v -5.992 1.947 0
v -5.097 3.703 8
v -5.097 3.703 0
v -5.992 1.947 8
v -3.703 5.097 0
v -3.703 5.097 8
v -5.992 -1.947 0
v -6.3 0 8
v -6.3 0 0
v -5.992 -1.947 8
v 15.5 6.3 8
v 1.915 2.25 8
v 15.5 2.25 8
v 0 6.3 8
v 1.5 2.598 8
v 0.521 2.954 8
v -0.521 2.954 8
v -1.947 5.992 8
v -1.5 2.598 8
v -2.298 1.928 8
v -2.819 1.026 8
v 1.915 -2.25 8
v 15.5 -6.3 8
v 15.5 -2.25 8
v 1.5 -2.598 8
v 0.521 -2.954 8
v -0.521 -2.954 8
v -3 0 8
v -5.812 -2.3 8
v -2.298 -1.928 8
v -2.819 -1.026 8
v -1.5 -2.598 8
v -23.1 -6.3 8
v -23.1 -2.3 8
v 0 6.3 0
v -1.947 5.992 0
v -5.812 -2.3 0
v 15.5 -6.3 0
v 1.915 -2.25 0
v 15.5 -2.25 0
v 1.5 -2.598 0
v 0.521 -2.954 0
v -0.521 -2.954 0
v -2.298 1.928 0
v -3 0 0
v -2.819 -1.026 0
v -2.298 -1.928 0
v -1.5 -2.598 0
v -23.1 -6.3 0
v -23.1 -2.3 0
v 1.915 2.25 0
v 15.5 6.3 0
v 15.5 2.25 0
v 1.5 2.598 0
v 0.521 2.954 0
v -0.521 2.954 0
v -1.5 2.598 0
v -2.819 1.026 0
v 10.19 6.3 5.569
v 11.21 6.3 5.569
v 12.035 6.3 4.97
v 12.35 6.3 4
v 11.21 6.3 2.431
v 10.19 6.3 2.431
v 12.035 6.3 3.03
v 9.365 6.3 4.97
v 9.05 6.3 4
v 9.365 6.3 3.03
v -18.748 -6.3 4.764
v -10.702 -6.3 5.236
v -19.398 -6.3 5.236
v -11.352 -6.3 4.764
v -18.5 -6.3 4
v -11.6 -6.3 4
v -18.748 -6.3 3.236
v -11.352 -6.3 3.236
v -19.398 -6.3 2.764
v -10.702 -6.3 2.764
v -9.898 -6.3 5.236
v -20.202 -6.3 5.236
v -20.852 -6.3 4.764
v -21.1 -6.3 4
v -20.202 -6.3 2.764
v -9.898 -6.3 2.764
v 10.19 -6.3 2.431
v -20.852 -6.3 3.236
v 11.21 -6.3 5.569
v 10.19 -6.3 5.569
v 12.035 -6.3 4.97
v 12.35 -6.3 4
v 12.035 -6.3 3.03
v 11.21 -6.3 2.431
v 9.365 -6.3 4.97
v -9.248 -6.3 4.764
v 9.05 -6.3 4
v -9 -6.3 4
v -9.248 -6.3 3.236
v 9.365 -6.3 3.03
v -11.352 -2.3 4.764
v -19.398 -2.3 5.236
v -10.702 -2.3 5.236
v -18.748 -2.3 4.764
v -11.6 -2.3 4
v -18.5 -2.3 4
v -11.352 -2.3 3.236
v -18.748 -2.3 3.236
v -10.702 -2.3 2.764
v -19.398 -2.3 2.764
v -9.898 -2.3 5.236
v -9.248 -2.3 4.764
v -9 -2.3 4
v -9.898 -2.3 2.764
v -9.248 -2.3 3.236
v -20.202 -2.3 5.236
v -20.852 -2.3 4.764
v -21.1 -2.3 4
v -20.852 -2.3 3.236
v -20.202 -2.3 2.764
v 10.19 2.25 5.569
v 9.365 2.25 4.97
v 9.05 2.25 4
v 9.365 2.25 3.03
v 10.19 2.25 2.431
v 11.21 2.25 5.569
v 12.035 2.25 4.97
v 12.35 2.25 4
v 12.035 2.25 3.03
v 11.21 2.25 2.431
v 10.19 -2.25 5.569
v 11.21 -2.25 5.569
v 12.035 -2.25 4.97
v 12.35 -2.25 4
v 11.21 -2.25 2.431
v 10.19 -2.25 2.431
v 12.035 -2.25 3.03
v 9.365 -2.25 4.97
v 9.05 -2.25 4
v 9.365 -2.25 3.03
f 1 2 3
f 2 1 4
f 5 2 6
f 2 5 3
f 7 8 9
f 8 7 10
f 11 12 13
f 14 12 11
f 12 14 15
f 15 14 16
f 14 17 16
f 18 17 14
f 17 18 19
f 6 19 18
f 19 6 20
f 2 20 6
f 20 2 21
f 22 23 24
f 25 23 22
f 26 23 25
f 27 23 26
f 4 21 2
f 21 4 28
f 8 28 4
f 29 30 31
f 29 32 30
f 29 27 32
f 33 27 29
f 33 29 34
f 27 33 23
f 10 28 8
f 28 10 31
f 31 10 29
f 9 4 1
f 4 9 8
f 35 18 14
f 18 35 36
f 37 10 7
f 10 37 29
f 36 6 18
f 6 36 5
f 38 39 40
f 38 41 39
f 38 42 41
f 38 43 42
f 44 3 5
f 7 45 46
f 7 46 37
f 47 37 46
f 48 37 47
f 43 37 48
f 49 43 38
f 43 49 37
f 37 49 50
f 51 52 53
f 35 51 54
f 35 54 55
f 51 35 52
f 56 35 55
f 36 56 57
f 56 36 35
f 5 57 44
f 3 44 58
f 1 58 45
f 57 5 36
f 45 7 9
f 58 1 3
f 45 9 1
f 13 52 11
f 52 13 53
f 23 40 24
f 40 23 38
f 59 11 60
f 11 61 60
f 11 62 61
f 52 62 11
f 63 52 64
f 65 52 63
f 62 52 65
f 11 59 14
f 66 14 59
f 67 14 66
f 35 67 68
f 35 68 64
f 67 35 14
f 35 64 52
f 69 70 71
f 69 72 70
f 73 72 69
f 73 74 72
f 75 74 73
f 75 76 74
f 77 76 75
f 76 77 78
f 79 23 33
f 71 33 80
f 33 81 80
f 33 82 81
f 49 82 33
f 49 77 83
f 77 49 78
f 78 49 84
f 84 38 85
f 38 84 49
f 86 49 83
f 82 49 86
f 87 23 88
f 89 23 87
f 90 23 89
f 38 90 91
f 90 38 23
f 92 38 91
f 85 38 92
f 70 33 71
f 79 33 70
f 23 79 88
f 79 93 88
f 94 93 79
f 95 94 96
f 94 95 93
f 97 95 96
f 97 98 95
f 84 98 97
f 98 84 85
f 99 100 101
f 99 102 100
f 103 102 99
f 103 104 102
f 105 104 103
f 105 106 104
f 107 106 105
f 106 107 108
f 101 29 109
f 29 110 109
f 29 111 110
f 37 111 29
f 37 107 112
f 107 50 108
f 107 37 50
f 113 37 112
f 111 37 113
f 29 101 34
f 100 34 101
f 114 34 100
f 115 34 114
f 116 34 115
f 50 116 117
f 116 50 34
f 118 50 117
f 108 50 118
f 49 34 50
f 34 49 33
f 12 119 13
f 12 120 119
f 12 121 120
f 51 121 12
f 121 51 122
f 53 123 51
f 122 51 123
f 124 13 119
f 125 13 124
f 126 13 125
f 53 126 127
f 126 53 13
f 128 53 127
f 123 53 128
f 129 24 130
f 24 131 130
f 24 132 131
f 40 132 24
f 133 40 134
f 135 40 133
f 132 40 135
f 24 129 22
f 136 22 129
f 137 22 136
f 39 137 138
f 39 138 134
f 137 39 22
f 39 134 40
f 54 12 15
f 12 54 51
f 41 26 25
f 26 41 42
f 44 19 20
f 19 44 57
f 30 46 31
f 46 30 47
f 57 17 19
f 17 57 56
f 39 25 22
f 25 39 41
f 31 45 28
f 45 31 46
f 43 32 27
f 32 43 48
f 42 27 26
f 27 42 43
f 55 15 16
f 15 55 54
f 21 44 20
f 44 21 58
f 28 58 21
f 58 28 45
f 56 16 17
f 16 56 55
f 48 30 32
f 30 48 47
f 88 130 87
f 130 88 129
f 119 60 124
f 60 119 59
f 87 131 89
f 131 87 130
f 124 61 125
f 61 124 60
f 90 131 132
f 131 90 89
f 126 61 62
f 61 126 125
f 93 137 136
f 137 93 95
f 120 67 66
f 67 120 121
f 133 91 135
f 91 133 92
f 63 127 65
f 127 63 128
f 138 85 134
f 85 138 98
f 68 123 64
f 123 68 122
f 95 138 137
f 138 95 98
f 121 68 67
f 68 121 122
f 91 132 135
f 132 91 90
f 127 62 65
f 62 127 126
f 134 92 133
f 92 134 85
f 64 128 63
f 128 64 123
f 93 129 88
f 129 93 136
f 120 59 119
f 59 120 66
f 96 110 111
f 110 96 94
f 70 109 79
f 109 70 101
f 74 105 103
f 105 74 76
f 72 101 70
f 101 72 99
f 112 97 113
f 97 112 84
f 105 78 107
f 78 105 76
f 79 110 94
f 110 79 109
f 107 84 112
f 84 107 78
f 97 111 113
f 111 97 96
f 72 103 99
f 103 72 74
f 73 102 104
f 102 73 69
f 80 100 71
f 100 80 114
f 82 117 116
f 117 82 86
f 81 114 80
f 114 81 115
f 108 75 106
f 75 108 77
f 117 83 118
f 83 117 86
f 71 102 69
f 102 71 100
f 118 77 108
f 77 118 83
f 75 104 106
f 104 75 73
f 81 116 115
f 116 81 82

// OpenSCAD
// file: parameters.scad
// Parameters file for RepRap Huxley

pi=3.14159265;

// The relative location in your file system where the .dxf files are
// DXFs are for quick development.  They should be replaced by parameterised CSG in dure course.

fileroot="DXF-files/";

rodsize = 6;	//threaded/smooth rod diameter in mm
xaxis = 182.5;	//width of base in mm
yaxis = 266.5;	//length of base in mm


screwsize = 3;	//bearing bore/screw diameter in mm
bearingsize = 10;	//outer diameter of bearings in mm
bearingwidth = 4;	//width of bearings in mm


rodpitch = rodsize / 6;
rodnutsize = 0.8 * rodsize; //4.8
rodwashersize = 0.2 * rodsize; //1.2
rodwasherdiameter = 2 * rodsize;//12
screwpitch = screwsize / 6;
nutsize = 0.8 * screwsize;
nutdiameter = 1.9 * screwsize;
washersize = 0.2 * screwsize;
washerdiameter = 2 * screwsize;
partthick = 2 * (rodsize+1); //12
vertexrodspace = 2 * rodsize; //12


c = [0.3, 0.3, 0.3];
rodendoffset = rodnutsize + rodwashersize * 2 + partthick / 2;//13.2
vertexoffset = vertexrodspace + rodendoffset;//25.2
//vertexoffset = 22;

renderrodthreads = false;
renderscrewthreads = false;
fn = 36;

// The gap between the joining rods at a vertex

vertex_radius=sqrt(rodsize*rodsize + vertexoffset*vertexoffset);
vertex_ang = atan(vertexoffset/rodsize)-30;
vertex_gap = 2*vertex_radius*cos(vertex_ang);

// Nema 14 dimensions - these are absolute

nema14_square=35.3;
nema14_screws=26;
nema14_screw_r=1.5;
nema14_hub=22;
nema14_hub_depth=2;
nema14_length=36;
nema14_shaft=5;
nema14_shaft_length=66;
nema14_shaft_projection=19;

// Nema 11 dimensions - these are absolute

nema11_square=28.5;
nema11_screws=23;
nema11_screw_r=1.25;
nema11_hub=22;
nema11_hub_depth=2;
nema11_length=44.5;
nema11_shaft=5;
nema11_shaft_length=78;
nema11_shaft_projection=18;

// Limit switch parameters

limit_switch_hole_diameter=2.5;
limit_switch_centres=9.5;

// The RepRap slide bearings

bearing_mount_centres=18;
bearing_width=7;

// X axis parameters - many should be relative

x_bar_gap=30;
motor_center_y = 26;
bar_clamp_x=5;
bar_clamp_y=8;
bar_clamp_x_gap=23;
bearing_y=50;
bearing_x=bar_clamp_x_gap + 10;
hole_land=4;
thickness=5;
bearing_low_z = 8;
bearing_z_gap = 25;
bearing_plate_width = bearing_mount_centres+2*hole_land + 10;
bearing_plate_overlap=0.5;
bearing_plate_support=10;
// file: configuration.scad
// eMAKEr Huxley
// Configuration file
// GNU GPL v3
// Jean-Marc Giacalone
// info@emakershop.com
// www.emakershop.com
// http://www.reprap.org/wiki/EMAKER_Huxley
// http://github.com/jmgiacalone/eMAKERHuxley

use <library.scad>

//Round corner diameter
round_corner_diameter = 8;

//Thin wall size
layer_height = 0.4;
perimeter_width_over_thicknes = 1.6;
infill_widht_over_thickness = 1.55;
thin_wall = 2*(perimeter_width_over_thicknes*layer_height+infill_widht_over_thickness*layer_height);
if(thin_wall<2){
	echo("Check thin wall size, its below 2mm!");
}
echo(thin_wall);

// MINI-HUXLEY VERSION (TODO, just place holder)
// include <configuration-huxley.scad>
m8_diameter=8.3;
m5_diameter=5.3;
m4_diameter=4.3;
m3_diameter=3.3;
m3_dia_clr=3.5;
m3_nut = 2.8;
m3_af = 5.8;
m6_diameter = 6;
m6_nut = 11.5;
bushing_diameter = 8;
motor_shaft=5.3;
bushing_rodsize = 6;
bushing_outerDiameter = 12;
bushing_lenght = 8;

// Some basic functions, probably should be somewhere else
// main file
// PRUSA Mendel  
// Endstop holder
// Used to attach endstops to 8mm rods
// GNU GPL v2
// Josef Průša
// josefprusa@me.com
// prusadjs.cz
// http://www.reprap.org/wiki/Prusa_Mendel
// http://github.com/prusajr/PrusaMendel


// Modified by Adrian to include support for sub-min microswitches. 15 May 2011
// Modified by JMG to fit 6mm rod for eMAKER Huxley. 5 Aug 2011

include <./configuration.scad>


/**
 *@name Endstop holder
 *@using 1 m3x20
 *@using 1 m3nut
 *@using 2 m3washer
 */
module endstop(){
height=8;
outer_diameter = m6_diameter/2+3.3;
screw_hole_spacing = 9.5; // Set to 20 to get standard design
opening_size = m6_diameter-1.5; //openingsize
switch_screw_hole_radius = 1.3; // Set to m3_diameter/2 to get standard design
pcb_mount=false; // Set false for endstop
translate([-outer_diameter, -outer_diameter, 0]) 
difference(){


	union(){




		translate([outer_diameter, outer_diameter, 0]) cylinder(h =height, r = outer_diameter, $fn = 20);
		translate([outer_diameter, 0, 0]) cube([15.5,outer_diameter*2,height]);
		if(!pcb_mount)
			translate([-42,0, 0]) cube([50, 4, height]);
	}


	// Chop the end just after the hole


	translate([-(56+screw_hole_spacing+ switch_screw_hole_radius), -10, -10]) 
		cube([50, 50, 50]);


	translate([8, outer_diameter-opening_size/2, 0]) cube([18,opening_size,20]);
	translate([outer_diameter, outer_diameter, 0]) cylinder(h =20, r = m6_diameter/2, $fn = 18);
	translate([17, 17, height/2]) rotate([90, 0, 0]) cylinder(h =20, r = m3_diameter/2, $fn = 10);
	translate([-4, 17, height/2]) rotate([90, 0, 0]) cylinder(h =20, r = switch_screw_hole_radius, $fn = 10);
	translate([-(4+screw_hole_spacing), 17, height/2]) rotate([90, 0, 0]) cylinder(h =20, r = switch_screw_hole_radius, $fn = 10);
}
}
	endstop();
//	translate([-12,5,0]) rotate([0,0,180])
//	endstop();
